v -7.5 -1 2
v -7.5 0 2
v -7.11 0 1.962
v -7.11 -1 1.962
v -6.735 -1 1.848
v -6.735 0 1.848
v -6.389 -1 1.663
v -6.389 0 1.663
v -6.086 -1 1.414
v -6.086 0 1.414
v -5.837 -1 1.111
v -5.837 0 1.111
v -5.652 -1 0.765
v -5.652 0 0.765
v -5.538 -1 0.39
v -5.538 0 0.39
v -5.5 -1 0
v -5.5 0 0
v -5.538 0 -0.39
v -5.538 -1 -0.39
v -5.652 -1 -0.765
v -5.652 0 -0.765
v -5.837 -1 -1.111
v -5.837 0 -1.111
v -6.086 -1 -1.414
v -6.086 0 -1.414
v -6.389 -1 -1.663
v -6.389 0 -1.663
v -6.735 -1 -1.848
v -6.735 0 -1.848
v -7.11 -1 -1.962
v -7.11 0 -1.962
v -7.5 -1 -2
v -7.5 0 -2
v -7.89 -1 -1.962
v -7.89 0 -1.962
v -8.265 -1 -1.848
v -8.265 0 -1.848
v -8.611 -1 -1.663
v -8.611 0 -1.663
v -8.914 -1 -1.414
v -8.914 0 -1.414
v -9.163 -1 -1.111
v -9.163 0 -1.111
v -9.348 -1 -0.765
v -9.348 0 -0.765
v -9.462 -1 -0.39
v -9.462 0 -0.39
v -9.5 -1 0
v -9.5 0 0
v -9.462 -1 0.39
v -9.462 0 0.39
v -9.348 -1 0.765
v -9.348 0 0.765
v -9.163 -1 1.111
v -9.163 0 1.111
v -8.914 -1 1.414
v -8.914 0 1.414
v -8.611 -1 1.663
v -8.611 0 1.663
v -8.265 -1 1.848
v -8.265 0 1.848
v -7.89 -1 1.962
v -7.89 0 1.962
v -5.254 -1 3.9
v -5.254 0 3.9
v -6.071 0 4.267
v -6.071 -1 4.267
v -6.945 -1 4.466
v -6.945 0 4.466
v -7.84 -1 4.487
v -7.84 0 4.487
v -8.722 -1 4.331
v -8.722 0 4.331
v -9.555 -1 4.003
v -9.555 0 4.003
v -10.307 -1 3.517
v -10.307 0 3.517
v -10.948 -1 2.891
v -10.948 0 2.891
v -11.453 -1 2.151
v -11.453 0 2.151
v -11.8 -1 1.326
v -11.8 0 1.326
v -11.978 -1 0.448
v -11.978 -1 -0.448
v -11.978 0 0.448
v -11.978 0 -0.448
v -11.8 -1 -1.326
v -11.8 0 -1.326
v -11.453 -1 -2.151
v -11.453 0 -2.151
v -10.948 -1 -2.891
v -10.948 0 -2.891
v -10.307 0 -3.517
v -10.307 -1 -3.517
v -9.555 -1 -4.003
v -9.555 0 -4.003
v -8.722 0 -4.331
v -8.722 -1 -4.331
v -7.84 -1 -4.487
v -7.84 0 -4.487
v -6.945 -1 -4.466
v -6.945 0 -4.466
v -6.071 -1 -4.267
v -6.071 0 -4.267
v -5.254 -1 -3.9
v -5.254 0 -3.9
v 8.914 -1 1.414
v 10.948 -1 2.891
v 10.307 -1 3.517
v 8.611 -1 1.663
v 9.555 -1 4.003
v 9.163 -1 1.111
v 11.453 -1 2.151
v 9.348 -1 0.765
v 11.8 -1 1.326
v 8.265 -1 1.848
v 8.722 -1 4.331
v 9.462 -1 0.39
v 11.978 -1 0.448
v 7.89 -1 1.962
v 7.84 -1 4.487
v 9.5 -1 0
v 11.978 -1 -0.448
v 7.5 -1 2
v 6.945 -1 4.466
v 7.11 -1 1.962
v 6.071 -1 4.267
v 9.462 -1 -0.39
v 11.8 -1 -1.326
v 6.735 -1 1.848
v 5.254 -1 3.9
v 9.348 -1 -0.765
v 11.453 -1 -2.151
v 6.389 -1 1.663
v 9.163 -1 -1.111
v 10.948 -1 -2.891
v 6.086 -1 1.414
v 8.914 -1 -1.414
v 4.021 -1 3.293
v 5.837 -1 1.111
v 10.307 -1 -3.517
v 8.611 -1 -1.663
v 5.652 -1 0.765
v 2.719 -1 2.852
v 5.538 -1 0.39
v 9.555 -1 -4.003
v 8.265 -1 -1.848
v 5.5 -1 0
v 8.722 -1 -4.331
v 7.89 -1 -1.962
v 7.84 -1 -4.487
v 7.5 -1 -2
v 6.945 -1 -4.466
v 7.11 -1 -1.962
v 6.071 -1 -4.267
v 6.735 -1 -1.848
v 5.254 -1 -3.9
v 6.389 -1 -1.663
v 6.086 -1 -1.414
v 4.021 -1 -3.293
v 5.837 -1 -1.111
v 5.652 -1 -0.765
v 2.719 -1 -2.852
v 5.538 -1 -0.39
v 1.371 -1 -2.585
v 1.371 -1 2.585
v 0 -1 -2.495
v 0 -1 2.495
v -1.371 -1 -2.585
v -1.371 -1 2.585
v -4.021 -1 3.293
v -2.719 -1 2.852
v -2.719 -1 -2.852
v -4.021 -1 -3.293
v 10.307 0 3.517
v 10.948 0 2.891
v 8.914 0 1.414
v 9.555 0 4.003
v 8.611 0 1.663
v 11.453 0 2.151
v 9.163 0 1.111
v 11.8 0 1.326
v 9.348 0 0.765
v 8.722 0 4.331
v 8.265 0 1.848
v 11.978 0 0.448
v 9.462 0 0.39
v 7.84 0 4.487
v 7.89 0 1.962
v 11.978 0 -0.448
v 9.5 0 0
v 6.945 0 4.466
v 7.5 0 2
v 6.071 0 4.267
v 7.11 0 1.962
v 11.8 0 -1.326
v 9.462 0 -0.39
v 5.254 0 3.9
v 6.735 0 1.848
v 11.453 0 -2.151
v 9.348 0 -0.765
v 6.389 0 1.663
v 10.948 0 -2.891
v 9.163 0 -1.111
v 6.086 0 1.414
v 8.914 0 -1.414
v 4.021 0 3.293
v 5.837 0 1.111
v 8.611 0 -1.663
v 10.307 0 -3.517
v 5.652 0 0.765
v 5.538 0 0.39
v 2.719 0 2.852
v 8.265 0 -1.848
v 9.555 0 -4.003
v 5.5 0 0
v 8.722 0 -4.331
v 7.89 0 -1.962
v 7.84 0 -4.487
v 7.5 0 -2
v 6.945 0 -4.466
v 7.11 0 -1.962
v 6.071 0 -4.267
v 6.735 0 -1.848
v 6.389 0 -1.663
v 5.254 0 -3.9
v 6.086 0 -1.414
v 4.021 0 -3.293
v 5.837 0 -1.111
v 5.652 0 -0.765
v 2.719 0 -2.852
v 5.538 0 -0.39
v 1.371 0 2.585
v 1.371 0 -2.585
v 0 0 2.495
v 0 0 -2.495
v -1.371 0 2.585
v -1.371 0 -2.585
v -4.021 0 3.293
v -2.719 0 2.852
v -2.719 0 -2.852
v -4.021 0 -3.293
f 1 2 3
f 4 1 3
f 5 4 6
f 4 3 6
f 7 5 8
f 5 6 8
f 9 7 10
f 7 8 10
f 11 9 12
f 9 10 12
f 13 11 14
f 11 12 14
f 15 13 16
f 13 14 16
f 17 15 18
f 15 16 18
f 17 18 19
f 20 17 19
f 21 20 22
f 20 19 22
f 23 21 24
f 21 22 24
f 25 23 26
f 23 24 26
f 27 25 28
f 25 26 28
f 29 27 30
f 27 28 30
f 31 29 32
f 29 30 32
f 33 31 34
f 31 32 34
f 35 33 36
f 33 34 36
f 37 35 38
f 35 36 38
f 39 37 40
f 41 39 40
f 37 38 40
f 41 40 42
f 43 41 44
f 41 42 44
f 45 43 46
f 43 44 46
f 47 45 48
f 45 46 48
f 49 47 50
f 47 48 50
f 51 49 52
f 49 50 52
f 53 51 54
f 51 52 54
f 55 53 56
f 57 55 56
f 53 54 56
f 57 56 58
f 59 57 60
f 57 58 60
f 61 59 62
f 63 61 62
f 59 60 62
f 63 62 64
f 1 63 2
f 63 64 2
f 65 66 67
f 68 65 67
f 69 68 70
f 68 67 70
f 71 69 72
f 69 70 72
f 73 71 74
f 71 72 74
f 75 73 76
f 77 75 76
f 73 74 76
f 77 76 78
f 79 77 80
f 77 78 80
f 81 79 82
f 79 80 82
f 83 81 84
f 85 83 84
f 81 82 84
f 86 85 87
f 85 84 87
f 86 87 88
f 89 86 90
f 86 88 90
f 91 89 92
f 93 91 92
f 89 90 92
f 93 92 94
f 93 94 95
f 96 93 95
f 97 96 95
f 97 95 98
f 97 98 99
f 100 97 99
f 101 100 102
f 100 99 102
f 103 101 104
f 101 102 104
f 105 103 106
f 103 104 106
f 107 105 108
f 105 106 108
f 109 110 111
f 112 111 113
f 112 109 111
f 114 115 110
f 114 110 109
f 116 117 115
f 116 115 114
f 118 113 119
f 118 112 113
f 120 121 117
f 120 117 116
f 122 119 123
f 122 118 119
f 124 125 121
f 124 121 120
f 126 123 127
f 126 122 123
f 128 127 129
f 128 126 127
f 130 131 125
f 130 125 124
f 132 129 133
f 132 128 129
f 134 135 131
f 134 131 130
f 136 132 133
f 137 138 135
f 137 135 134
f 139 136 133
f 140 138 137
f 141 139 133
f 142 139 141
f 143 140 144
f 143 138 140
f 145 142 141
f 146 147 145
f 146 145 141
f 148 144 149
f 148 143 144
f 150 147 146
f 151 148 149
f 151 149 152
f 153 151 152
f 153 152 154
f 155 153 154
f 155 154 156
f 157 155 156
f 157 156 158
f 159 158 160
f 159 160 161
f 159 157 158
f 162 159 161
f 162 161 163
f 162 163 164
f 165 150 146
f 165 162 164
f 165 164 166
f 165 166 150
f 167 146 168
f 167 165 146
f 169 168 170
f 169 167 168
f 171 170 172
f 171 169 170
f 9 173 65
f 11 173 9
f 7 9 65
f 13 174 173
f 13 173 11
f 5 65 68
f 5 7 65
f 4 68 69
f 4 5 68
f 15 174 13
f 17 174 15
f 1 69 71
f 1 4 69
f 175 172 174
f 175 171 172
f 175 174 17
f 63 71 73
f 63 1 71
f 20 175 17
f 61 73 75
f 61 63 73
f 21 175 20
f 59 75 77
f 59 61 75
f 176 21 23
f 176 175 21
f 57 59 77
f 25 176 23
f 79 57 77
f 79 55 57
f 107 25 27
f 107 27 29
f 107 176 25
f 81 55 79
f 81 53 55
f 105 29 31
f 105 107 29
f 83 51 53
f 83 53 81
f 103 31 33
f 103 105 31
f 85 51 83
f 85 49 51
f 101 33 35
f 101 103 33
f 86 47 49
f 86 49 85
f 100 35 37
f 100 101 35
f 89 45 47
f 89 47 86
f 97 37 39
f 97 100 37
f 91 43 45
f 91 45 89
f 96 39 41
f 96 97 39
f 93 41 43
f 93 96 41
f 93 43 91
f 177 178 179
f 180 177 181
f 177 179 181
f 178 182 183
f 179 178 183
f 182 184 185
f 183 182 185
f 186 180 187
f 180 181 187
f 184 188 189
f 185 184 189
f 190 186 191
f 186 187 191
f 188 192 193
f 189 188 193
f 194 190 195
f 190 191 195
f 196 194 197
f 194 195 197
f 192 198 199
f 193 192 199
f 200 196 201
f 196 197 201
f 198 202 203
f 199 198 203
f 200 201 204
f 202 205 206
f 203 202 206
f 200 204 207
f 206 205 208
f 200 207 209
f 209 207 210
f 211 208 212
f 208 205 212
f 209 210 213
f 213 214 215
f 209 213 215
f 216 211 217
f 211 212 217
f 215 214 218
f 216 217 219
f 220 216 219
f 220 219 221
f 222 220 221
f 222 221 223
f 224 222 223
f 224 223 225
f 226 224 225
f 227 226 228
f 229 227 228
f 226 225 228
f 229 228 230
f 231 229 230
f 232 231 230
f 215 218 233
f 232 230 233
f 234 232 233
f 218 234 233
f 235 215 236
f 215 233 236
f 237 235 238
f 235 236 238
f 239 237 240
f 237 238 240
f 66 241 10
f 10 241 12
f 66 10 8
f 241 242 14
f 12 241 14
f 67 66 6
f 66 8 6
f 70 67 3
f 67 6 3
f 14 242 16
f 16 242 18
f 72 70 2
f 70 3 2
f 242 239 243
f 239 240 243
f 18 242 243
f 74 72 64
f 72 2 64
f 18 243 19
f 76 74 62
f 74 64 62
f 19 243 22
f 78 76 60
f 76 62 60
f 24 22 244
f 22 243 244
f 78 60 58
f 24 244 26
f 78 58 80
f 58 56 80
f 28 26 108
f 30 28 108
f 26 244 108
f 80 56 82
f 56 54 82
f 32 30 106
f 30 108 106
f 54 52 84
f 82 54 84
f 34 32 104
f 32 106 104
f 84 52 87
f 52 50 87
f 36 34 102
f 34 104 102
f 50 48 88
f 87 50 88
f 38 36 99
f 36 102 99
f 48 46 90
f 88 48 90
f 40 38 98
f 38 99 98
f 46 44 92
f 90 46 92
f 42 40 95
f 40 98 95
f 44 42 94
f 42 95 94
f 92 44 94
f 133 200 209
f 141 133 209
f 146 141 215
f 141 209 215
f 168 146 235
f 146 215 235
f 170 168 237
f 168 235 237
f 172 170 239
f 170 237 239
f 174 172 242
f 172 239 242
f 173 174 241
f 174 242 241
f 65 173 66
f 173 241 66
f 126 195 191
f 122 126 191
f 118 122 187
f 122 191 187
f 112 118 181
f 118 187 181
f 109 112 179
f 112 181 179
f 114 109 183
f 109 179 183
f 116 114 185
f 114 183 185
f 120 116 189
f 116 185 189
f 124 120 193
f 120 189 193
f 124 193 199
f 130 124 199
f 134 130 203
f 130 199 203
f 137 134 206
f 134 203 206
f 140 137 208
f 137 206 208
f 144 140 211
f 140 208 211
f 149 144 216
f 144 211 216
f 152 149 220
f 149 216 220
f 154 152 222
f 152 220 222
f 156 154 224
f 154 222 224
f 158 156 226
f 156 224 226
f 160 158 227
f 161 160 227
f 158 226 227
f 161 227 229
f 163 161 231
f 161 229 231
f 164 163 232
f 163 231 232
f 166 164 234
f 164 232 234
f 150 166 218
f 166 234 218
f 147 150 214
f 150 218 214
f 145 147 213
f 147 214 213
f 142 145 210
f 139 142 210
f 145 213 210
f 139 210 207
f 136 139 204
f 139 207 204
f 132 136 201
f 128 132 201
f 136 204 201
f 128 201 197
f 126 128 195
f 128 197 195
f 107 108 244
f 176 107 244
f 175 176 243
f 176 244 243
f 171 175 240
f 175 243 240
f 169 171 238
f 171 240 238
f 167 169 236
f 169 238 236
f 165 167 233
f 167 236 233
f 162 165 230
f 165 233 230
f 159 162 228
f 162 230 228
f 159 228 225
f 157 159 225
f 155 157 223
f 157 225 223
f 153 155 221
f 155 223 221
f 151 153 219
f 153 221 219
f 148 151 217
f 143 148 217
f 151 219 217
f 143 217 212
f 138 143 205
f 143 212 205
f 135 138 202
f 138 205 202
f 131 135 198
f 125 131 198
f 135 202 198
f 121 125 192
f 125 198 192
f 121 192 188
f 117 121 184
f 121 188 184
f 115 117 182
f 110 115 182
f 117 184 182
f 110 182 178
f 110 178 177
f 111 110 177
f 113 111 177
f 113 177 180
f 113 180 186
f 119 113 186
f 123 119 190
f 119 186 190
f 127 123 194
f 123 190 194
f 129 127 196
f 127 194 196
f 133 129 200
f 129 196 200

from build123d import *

# Parameters (mm, degrees)
SKIZZE2_R          = 2
BASIS_BLECH1_DEPTH = 1


# Sheet-metal steps are written as plain solids
with BuildPart() as part:
    # Skizze2 → Basis-Blech1 (new body)
    with BuildSketch(Plane(origin=(0, 0, 0), x_dir=(1, 0, 0), z_dir=(0, 1, 0))):
        with BuildLine():
            ThreePointArc((-5.254458339, 3.899684942), (0, 2.494976886), (5.254458339, 3.899684942))
            ThreePointArc((5.254458339, 3.899684942), (12, 0), (5.254458339, -3.899684942))
            ThreePointArc((5.254458339, -3.899684942), (0, -2.494976886), (-5.254458339, -3.899684942))
            ThreePointArc((-5.254458339, -3.899684942), (-12, 0), (-5.254458339, 3.899684942))
        make_face()
        with Locations(Location((-7.5, 0, 0), (0, 0, 270))):
            Circle(SKIZZE2_R, mode=Mode.SUBTRACT)
        with Locations(Location((7.5, 0, 0), (0, 0, 270))):
            Circle(SKIZZE2_R, mode=Mode.SUBTRACT)
    extrude(amount=-BASIS_BLECH1_DEPTH)


solid = part.part
